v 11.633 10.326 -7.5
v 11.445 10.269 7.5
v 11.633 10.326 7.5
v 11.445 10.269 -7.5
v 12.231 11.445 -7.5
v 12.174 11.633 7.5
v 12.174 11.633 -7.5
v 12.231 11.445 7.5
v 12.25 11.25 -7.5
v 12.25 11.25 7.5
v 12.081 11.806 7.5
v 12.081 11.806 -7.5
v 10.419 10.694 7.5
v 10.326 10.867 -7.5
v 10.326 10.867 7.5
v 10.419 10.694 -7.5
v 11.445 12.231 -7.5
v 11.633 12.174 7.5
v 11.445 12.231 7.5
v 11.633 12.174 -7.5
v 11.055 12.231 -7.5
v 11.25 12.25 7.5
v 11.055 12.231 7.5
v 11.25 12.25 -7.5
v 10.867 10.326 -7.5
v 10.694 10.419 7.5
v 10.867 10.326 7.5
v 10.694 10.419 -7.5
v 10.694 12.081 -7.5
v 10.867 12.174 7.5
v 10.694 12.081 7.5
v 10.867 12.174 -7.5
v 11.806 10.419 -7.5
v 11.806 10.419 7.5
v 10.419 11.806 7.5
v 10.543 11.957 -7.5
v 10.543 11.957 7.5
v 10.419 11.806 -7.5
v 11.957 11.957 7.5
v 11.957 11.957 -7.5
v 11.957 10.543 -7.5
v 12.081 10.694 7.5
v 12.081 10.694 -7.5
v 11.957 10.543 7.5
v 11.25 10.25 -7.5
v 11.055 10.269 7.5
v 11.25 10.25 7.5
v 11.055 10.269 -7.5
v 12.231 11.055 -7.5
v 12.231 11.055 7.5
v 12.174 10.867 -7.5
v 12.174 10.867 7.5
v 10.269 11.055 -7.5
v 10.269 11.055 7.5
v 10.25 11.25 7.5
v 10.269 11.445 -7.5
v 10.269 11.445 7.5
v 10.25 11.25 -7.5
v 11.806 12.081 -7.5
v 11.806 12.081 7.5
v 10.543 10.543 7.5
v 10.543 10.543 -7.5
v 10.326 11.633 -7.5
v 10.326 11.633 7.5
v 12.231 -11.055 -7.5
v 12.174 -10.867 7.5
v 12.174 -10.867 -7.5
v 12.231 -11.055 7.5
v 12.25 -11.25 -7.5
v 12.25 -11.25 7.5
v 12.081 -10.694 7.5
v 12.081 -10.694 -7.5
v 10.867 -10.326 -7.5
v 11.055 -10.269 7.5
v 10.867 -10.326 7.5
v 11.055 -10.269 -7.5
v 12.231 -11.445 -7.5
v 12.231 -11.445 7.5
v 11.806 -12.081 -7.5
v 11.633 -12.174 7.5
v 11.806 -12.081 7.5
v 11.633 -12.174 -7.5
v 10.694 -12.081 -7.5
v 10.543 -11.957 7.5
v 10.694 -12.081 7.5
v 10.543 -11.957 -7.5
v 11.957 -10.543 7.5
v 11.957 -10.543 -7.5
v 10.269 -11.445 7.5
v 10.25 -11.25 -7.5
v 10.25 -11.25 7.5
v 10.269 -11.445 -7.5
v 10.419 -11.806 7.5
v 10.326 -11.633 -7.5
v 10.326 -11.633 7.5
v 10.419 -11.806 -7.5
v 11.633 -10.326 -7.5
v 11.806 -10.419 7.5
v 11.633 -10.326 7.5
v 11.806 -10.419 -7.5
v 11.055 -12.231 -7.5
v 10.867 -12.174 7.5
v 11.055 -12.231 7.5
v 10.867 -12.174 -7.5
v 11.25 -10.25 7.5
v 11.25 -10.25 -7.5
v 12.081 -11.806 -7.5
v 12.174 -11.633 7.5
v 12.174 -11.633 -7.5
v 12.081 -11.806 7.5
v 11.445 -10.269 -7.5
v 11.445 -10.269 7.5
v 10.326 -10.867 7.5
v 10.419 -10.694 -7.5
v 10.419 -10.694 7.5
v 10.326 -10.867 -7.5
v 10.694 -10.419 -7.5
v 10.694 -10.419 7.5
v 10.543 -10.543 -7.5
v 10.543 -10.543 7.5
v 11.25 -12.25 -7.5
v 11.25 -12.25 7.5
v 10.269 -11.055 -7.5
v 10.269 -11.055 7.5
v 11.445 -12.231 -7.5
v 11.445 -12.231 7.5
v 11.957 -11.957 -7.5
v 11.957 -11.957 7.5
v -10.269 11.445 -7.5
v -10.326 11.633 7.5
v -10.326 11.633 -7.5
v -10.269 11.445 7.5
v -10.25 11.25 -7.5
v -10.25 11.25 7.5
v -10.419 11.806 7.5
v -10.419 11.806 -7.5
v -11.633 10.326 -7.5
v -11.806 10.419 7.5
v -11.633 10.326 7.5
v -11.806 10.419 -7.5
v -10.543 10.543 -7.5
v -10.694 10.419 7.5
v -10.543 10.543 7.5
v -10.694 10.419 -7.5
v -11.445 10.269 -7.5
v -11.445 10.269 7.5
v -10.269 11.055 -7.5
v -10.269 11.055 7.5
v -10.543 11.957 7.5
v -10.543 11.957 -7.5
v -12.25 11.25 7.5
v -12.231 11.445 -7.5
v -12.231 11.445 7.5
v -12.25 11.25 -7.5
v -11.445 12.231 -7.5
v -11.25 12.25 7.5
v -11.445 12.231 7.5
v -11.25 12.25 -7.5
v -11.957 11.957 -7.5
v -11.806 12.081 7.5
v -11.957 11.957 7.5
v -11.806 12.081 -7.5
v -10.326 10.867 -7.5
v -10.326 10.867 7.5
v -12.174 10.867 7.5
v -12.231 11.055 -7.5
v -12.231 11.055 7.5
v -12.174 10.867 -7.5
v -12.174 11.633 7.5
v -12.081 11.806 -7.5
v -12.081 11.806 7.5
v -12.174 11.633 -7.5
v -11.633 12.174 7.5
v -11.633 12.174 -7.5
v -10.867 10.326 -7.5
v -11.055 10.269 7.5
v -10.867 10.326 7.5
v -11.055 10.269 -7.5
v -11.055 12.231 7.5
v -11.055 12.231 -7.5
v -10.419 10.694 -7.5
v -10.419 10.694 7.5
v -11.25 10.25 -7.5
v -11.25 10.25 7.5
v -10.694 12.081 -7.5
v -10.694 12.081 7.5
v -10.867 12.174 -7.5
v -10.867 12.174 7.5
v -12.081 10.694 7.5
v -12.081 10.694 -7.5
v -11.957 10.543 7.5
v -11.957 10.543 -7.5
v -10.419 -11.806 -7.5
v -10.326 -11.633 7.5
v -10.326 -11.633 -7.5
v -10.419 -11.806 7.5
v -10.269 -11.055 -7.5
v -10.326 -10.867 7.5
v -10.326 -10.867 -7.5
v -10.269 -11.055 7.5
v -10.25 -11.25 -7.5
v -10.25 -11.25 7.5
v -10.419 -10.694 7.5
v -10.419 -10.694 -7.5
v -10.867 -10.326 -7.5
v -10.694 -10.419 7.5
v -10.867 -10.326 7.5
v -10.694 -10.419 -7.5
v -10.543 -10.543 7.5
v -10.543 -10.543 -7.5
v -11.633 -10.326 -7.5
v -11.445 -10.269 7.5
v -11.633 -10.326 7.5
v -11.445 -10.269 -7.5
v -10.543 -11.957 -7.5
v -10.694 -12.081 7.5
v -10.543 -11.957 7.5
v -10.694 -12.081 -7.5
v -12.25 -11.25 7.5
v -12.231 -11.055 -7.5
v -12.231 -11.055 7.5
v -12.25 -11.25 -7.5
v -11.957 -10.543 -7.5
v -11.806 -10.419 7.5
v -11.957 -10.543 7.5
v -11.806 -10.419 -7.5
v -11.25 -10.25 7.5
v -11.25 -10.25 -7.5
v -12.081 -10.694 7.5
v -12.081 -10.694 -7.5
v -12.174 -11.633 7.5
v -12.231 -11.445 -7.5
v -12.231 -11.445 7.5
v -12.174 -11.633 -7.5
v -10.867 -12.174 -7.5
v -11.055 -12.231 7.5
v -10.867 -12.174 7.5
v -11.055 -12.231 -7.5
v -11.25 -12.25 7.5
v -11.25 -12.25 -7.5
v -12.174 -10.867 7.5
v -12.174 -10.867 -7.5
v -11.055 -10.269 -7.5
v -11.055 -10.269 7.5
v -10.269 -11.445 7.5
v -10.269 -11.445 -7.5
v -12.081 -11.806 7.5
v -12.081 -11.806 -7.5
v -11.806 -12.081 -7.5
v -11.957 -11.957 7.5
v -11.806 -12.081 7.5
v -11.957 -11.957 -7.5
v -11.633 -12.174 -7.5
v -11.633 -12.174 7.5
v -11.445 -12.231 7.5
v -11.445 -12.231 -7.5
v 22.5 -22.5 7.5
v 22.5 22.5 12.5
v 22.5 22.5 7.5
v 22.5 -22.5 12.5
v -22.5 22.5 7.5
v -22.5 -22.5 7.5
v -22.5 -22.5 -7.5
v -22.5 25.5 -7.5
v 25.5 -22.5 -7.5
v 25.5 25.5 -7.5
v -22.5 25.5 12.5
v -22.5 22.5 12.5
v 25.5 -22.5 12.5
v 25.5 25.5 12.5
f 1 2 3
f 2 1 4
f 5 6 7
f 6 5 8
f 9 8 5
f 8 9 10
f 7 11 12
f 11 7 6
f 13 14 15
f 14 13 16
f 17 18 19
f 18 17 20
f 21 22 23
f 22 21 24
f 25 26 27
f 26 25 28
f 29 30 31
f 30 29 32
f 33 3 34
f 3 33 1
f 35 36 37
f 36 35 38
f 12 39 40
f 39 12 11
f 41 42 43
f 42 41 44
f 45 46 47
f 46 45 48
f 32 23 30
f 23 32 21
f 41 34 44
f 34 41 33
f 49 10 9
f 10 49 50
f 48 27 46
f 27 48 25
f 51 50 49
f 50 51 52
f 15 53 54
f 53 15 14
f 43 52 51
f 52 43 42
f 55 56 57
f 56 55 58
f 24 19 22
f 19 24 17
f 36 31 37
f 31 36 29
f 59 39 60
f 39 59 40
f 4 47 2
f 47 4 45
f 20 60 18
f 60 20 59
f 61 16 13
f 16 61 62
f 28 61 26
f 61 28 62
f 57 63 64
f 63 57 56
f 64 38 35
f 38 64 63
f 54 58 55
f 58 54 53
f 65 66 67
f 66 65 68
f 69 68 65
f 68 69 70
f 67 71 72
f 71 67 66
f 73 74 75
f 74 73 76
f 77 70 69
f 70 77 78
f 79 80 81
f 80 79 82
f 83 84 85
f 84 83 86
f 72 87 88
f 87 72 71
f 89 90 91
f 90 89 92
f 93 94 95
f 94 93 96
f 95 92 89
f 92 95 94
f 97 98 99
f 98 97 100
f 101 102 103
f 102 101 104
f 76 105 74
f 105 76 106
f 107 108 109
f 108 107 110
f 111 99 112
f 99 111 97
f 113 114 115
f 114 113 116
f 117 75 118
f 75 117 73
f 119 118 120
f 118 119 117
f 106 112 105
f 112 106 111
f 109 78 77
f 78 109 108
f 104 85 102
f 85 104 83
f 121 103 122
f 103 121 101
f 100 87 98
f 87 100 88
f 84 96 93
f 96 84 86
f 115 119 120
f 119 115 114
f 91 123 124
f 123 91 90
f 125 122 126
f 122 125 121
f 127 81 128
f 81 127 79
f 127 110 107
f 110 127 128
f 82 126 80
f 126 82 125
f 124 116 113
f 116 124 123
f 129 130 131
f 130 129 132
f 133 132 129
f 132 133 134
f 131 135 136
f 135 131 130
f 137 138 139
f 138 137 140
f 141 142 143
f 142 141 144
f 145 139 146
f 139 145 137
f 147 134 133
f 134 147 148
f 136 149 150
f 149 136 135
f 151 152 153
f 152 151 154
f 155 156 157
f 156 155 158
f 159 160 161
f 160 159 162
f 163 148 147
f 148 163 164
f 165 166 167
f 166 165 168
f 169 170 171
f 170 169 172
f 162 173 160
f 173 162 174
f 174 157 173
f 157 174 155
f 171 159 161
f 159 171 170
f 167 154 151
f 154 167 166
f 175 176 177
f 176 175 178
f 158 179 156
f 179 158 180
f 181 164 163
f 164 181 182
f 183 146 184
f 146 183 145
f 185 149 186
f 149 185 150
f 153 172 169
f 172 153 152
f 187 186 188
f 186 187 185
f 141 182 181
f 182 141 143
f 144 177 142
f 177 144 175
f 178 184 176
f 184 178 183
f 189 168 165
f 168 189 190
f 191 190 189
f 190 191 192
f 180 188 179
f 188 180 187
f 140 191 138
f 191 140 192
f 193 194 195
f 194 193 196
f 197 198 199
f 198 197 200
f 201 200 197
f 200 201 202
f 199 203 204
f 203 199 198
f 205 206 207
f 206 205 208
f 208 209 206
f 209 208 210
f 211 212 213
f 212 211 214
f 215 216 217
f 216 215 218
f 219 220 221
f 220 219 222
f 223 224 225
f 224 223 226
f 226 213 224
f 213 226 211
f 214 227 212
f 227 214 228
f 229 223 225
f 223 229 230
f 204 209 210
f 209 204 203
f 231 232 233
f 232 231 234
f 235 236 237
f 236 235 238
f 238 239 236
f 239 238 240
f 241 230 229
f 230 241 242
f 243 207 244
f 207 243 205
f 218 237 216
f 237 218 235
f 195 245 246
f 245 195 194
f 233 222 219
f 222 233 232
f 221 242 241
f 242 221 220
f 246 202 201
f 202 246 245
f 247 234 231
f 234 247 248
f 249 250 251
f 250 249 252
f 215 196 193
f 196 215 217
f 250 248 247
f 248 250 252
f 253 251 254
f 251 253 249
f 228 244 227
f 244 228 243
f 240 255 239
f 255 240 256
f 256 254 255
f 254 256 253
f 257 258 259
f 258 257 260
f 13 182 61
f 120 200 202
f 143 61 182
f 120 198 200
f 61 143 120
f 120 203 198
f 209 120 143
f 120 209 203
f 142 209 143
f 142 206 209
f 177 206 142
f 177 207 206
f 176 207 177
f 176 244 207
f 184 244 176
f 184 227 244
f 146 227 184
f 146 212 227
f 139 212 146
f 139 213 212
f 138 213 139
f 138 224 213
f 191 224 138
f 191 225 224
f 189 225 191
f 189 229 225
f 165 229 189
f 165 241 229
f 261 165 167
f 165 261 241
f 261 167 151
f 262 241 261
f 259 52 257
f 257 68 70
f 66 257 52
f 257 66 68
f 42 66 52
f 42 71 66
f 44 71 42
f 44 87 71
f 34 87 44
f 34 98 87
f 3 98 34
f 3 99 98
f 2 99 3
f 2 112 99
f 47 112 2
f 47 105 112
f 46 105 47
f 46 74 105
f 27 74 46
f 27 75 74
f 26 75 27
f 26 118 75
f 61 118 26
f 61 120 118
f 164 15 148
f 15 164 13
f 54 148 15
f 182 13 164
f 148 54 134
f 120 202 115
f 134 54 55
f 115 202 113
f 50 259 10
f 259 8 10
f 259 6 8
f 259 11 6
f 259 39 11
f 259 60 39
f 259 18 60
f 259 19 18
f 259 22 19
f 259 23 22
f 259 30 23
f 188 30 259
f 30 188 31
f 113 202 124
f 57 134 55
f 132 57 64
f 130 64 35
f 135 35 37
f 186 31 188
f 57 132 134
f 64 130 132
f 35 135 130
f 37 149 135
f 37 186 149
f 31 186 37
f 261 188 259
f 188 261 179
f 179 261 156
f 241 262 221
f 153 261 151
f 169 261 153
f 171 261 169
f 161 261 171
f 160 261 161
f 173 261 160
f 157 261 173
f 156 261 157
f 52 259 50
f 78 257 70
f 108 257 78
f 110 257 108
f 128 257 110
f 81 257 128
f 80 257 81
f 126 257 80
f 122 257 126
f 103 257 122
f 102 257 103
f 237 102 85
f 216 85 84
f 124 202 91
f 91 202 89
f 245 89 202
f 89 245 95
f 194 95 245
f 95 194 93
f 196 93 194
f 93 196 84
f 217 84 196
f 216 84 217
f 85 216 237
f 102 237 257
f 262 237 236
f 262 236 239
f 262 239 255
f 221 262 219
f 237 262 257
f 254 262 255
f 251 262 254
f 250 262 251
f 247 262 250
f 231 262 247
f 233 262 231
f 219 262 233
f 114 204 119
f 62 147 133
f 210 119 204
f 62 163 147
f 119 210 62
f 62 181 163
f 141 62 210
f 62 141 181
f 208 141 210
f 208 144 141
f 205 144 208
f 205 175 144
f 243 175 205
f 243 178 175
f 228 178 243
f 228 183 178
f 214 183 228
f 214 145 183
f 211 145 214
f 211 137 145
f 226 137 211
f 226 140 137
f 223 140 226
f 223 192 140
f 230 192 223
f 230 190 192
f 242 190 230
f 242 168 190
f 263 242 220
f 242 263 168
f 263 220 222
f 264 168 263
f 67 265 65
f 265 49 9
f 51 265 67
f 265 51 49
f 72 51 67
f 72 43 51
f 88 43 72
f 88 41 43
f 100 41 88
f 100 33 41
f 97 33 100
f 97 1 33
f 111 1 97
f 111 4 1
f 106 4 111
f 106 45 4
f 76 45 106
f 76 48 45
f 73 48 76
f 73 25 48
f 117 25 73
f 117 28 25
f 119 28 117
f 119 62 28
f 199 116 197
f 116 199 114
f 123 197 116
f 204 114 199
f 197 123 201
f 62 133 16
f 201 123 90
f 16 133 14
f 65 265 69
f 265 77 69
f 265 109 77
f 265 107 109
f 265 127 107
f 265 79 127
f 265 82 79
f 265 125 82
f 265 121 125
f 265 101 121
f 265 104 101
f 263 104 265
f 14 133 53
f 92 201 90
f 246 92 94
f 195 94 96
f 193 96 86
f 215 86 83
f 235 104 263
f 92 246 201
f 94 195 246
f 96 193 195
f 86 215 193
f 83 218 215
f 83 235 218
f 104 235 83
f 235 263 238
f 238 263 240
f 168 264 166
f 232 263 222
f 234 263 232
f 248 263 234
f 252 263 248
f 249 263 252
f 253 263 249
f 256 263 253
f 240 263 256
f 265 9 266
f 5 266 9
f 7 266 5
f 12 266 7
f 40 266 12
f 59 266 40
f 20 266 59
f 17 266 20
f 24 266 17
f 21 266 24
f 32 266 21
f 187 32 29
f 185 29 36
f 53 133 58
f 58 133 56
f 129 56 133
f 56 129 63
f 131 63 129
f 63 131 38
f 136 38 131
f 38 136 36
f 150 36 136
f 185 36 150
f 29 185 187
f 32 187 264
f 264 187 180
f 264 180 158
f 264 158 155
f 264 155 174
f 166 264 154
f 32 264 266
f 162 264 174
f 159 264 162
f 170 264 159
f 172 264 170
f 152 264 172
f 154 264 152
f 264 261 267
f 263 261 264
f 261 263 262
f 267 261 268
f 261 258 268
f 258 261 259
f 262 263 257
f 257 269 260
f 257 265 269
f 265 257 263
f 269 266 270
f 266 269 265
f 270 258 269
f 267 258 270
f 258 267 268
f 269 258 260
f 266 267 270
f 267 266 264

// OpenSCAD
// the size of the vertical posts
BEAM = 45;

// how long the drill must be guided
HEIGHT = 15;

// the ledge for finding te corner
LEDGE_HEIGHT = 5;

// strength of the ledge
WALL = 3;

// diameter of the pilot holes
SCREW = 2;

module dummy() {};

$fa = $preview? 12 : 4;
$fs = $preview? 2 : 0.2;

EPS = 0.01;

module drill_guide(
    beam=BEAM,
    height=HEIGHT,
    screw=SCREW,
    wall=WALL,
    ledge_height=LEDGE_HEIGHT
) {
    
    module ledge() {
        translate([beam/2+wall/2,wall/2,ledge_height/2])
            cube([wall,beam+wall,height+ledge_height], center=true);       
    }

    distance = beam / 4;

    difference() {
        cube([beam, beam, height], center=true);
        
        for(x=[1,-1])
            for(y=[1,-1])
                translate([x * distance, y * distance])
                    cylinder(height+EPS, r=screw/2, center=true);
    }

    ledge();
    rotate(90) mirror([0,1,0]) ledge();
}

drill_guide();
